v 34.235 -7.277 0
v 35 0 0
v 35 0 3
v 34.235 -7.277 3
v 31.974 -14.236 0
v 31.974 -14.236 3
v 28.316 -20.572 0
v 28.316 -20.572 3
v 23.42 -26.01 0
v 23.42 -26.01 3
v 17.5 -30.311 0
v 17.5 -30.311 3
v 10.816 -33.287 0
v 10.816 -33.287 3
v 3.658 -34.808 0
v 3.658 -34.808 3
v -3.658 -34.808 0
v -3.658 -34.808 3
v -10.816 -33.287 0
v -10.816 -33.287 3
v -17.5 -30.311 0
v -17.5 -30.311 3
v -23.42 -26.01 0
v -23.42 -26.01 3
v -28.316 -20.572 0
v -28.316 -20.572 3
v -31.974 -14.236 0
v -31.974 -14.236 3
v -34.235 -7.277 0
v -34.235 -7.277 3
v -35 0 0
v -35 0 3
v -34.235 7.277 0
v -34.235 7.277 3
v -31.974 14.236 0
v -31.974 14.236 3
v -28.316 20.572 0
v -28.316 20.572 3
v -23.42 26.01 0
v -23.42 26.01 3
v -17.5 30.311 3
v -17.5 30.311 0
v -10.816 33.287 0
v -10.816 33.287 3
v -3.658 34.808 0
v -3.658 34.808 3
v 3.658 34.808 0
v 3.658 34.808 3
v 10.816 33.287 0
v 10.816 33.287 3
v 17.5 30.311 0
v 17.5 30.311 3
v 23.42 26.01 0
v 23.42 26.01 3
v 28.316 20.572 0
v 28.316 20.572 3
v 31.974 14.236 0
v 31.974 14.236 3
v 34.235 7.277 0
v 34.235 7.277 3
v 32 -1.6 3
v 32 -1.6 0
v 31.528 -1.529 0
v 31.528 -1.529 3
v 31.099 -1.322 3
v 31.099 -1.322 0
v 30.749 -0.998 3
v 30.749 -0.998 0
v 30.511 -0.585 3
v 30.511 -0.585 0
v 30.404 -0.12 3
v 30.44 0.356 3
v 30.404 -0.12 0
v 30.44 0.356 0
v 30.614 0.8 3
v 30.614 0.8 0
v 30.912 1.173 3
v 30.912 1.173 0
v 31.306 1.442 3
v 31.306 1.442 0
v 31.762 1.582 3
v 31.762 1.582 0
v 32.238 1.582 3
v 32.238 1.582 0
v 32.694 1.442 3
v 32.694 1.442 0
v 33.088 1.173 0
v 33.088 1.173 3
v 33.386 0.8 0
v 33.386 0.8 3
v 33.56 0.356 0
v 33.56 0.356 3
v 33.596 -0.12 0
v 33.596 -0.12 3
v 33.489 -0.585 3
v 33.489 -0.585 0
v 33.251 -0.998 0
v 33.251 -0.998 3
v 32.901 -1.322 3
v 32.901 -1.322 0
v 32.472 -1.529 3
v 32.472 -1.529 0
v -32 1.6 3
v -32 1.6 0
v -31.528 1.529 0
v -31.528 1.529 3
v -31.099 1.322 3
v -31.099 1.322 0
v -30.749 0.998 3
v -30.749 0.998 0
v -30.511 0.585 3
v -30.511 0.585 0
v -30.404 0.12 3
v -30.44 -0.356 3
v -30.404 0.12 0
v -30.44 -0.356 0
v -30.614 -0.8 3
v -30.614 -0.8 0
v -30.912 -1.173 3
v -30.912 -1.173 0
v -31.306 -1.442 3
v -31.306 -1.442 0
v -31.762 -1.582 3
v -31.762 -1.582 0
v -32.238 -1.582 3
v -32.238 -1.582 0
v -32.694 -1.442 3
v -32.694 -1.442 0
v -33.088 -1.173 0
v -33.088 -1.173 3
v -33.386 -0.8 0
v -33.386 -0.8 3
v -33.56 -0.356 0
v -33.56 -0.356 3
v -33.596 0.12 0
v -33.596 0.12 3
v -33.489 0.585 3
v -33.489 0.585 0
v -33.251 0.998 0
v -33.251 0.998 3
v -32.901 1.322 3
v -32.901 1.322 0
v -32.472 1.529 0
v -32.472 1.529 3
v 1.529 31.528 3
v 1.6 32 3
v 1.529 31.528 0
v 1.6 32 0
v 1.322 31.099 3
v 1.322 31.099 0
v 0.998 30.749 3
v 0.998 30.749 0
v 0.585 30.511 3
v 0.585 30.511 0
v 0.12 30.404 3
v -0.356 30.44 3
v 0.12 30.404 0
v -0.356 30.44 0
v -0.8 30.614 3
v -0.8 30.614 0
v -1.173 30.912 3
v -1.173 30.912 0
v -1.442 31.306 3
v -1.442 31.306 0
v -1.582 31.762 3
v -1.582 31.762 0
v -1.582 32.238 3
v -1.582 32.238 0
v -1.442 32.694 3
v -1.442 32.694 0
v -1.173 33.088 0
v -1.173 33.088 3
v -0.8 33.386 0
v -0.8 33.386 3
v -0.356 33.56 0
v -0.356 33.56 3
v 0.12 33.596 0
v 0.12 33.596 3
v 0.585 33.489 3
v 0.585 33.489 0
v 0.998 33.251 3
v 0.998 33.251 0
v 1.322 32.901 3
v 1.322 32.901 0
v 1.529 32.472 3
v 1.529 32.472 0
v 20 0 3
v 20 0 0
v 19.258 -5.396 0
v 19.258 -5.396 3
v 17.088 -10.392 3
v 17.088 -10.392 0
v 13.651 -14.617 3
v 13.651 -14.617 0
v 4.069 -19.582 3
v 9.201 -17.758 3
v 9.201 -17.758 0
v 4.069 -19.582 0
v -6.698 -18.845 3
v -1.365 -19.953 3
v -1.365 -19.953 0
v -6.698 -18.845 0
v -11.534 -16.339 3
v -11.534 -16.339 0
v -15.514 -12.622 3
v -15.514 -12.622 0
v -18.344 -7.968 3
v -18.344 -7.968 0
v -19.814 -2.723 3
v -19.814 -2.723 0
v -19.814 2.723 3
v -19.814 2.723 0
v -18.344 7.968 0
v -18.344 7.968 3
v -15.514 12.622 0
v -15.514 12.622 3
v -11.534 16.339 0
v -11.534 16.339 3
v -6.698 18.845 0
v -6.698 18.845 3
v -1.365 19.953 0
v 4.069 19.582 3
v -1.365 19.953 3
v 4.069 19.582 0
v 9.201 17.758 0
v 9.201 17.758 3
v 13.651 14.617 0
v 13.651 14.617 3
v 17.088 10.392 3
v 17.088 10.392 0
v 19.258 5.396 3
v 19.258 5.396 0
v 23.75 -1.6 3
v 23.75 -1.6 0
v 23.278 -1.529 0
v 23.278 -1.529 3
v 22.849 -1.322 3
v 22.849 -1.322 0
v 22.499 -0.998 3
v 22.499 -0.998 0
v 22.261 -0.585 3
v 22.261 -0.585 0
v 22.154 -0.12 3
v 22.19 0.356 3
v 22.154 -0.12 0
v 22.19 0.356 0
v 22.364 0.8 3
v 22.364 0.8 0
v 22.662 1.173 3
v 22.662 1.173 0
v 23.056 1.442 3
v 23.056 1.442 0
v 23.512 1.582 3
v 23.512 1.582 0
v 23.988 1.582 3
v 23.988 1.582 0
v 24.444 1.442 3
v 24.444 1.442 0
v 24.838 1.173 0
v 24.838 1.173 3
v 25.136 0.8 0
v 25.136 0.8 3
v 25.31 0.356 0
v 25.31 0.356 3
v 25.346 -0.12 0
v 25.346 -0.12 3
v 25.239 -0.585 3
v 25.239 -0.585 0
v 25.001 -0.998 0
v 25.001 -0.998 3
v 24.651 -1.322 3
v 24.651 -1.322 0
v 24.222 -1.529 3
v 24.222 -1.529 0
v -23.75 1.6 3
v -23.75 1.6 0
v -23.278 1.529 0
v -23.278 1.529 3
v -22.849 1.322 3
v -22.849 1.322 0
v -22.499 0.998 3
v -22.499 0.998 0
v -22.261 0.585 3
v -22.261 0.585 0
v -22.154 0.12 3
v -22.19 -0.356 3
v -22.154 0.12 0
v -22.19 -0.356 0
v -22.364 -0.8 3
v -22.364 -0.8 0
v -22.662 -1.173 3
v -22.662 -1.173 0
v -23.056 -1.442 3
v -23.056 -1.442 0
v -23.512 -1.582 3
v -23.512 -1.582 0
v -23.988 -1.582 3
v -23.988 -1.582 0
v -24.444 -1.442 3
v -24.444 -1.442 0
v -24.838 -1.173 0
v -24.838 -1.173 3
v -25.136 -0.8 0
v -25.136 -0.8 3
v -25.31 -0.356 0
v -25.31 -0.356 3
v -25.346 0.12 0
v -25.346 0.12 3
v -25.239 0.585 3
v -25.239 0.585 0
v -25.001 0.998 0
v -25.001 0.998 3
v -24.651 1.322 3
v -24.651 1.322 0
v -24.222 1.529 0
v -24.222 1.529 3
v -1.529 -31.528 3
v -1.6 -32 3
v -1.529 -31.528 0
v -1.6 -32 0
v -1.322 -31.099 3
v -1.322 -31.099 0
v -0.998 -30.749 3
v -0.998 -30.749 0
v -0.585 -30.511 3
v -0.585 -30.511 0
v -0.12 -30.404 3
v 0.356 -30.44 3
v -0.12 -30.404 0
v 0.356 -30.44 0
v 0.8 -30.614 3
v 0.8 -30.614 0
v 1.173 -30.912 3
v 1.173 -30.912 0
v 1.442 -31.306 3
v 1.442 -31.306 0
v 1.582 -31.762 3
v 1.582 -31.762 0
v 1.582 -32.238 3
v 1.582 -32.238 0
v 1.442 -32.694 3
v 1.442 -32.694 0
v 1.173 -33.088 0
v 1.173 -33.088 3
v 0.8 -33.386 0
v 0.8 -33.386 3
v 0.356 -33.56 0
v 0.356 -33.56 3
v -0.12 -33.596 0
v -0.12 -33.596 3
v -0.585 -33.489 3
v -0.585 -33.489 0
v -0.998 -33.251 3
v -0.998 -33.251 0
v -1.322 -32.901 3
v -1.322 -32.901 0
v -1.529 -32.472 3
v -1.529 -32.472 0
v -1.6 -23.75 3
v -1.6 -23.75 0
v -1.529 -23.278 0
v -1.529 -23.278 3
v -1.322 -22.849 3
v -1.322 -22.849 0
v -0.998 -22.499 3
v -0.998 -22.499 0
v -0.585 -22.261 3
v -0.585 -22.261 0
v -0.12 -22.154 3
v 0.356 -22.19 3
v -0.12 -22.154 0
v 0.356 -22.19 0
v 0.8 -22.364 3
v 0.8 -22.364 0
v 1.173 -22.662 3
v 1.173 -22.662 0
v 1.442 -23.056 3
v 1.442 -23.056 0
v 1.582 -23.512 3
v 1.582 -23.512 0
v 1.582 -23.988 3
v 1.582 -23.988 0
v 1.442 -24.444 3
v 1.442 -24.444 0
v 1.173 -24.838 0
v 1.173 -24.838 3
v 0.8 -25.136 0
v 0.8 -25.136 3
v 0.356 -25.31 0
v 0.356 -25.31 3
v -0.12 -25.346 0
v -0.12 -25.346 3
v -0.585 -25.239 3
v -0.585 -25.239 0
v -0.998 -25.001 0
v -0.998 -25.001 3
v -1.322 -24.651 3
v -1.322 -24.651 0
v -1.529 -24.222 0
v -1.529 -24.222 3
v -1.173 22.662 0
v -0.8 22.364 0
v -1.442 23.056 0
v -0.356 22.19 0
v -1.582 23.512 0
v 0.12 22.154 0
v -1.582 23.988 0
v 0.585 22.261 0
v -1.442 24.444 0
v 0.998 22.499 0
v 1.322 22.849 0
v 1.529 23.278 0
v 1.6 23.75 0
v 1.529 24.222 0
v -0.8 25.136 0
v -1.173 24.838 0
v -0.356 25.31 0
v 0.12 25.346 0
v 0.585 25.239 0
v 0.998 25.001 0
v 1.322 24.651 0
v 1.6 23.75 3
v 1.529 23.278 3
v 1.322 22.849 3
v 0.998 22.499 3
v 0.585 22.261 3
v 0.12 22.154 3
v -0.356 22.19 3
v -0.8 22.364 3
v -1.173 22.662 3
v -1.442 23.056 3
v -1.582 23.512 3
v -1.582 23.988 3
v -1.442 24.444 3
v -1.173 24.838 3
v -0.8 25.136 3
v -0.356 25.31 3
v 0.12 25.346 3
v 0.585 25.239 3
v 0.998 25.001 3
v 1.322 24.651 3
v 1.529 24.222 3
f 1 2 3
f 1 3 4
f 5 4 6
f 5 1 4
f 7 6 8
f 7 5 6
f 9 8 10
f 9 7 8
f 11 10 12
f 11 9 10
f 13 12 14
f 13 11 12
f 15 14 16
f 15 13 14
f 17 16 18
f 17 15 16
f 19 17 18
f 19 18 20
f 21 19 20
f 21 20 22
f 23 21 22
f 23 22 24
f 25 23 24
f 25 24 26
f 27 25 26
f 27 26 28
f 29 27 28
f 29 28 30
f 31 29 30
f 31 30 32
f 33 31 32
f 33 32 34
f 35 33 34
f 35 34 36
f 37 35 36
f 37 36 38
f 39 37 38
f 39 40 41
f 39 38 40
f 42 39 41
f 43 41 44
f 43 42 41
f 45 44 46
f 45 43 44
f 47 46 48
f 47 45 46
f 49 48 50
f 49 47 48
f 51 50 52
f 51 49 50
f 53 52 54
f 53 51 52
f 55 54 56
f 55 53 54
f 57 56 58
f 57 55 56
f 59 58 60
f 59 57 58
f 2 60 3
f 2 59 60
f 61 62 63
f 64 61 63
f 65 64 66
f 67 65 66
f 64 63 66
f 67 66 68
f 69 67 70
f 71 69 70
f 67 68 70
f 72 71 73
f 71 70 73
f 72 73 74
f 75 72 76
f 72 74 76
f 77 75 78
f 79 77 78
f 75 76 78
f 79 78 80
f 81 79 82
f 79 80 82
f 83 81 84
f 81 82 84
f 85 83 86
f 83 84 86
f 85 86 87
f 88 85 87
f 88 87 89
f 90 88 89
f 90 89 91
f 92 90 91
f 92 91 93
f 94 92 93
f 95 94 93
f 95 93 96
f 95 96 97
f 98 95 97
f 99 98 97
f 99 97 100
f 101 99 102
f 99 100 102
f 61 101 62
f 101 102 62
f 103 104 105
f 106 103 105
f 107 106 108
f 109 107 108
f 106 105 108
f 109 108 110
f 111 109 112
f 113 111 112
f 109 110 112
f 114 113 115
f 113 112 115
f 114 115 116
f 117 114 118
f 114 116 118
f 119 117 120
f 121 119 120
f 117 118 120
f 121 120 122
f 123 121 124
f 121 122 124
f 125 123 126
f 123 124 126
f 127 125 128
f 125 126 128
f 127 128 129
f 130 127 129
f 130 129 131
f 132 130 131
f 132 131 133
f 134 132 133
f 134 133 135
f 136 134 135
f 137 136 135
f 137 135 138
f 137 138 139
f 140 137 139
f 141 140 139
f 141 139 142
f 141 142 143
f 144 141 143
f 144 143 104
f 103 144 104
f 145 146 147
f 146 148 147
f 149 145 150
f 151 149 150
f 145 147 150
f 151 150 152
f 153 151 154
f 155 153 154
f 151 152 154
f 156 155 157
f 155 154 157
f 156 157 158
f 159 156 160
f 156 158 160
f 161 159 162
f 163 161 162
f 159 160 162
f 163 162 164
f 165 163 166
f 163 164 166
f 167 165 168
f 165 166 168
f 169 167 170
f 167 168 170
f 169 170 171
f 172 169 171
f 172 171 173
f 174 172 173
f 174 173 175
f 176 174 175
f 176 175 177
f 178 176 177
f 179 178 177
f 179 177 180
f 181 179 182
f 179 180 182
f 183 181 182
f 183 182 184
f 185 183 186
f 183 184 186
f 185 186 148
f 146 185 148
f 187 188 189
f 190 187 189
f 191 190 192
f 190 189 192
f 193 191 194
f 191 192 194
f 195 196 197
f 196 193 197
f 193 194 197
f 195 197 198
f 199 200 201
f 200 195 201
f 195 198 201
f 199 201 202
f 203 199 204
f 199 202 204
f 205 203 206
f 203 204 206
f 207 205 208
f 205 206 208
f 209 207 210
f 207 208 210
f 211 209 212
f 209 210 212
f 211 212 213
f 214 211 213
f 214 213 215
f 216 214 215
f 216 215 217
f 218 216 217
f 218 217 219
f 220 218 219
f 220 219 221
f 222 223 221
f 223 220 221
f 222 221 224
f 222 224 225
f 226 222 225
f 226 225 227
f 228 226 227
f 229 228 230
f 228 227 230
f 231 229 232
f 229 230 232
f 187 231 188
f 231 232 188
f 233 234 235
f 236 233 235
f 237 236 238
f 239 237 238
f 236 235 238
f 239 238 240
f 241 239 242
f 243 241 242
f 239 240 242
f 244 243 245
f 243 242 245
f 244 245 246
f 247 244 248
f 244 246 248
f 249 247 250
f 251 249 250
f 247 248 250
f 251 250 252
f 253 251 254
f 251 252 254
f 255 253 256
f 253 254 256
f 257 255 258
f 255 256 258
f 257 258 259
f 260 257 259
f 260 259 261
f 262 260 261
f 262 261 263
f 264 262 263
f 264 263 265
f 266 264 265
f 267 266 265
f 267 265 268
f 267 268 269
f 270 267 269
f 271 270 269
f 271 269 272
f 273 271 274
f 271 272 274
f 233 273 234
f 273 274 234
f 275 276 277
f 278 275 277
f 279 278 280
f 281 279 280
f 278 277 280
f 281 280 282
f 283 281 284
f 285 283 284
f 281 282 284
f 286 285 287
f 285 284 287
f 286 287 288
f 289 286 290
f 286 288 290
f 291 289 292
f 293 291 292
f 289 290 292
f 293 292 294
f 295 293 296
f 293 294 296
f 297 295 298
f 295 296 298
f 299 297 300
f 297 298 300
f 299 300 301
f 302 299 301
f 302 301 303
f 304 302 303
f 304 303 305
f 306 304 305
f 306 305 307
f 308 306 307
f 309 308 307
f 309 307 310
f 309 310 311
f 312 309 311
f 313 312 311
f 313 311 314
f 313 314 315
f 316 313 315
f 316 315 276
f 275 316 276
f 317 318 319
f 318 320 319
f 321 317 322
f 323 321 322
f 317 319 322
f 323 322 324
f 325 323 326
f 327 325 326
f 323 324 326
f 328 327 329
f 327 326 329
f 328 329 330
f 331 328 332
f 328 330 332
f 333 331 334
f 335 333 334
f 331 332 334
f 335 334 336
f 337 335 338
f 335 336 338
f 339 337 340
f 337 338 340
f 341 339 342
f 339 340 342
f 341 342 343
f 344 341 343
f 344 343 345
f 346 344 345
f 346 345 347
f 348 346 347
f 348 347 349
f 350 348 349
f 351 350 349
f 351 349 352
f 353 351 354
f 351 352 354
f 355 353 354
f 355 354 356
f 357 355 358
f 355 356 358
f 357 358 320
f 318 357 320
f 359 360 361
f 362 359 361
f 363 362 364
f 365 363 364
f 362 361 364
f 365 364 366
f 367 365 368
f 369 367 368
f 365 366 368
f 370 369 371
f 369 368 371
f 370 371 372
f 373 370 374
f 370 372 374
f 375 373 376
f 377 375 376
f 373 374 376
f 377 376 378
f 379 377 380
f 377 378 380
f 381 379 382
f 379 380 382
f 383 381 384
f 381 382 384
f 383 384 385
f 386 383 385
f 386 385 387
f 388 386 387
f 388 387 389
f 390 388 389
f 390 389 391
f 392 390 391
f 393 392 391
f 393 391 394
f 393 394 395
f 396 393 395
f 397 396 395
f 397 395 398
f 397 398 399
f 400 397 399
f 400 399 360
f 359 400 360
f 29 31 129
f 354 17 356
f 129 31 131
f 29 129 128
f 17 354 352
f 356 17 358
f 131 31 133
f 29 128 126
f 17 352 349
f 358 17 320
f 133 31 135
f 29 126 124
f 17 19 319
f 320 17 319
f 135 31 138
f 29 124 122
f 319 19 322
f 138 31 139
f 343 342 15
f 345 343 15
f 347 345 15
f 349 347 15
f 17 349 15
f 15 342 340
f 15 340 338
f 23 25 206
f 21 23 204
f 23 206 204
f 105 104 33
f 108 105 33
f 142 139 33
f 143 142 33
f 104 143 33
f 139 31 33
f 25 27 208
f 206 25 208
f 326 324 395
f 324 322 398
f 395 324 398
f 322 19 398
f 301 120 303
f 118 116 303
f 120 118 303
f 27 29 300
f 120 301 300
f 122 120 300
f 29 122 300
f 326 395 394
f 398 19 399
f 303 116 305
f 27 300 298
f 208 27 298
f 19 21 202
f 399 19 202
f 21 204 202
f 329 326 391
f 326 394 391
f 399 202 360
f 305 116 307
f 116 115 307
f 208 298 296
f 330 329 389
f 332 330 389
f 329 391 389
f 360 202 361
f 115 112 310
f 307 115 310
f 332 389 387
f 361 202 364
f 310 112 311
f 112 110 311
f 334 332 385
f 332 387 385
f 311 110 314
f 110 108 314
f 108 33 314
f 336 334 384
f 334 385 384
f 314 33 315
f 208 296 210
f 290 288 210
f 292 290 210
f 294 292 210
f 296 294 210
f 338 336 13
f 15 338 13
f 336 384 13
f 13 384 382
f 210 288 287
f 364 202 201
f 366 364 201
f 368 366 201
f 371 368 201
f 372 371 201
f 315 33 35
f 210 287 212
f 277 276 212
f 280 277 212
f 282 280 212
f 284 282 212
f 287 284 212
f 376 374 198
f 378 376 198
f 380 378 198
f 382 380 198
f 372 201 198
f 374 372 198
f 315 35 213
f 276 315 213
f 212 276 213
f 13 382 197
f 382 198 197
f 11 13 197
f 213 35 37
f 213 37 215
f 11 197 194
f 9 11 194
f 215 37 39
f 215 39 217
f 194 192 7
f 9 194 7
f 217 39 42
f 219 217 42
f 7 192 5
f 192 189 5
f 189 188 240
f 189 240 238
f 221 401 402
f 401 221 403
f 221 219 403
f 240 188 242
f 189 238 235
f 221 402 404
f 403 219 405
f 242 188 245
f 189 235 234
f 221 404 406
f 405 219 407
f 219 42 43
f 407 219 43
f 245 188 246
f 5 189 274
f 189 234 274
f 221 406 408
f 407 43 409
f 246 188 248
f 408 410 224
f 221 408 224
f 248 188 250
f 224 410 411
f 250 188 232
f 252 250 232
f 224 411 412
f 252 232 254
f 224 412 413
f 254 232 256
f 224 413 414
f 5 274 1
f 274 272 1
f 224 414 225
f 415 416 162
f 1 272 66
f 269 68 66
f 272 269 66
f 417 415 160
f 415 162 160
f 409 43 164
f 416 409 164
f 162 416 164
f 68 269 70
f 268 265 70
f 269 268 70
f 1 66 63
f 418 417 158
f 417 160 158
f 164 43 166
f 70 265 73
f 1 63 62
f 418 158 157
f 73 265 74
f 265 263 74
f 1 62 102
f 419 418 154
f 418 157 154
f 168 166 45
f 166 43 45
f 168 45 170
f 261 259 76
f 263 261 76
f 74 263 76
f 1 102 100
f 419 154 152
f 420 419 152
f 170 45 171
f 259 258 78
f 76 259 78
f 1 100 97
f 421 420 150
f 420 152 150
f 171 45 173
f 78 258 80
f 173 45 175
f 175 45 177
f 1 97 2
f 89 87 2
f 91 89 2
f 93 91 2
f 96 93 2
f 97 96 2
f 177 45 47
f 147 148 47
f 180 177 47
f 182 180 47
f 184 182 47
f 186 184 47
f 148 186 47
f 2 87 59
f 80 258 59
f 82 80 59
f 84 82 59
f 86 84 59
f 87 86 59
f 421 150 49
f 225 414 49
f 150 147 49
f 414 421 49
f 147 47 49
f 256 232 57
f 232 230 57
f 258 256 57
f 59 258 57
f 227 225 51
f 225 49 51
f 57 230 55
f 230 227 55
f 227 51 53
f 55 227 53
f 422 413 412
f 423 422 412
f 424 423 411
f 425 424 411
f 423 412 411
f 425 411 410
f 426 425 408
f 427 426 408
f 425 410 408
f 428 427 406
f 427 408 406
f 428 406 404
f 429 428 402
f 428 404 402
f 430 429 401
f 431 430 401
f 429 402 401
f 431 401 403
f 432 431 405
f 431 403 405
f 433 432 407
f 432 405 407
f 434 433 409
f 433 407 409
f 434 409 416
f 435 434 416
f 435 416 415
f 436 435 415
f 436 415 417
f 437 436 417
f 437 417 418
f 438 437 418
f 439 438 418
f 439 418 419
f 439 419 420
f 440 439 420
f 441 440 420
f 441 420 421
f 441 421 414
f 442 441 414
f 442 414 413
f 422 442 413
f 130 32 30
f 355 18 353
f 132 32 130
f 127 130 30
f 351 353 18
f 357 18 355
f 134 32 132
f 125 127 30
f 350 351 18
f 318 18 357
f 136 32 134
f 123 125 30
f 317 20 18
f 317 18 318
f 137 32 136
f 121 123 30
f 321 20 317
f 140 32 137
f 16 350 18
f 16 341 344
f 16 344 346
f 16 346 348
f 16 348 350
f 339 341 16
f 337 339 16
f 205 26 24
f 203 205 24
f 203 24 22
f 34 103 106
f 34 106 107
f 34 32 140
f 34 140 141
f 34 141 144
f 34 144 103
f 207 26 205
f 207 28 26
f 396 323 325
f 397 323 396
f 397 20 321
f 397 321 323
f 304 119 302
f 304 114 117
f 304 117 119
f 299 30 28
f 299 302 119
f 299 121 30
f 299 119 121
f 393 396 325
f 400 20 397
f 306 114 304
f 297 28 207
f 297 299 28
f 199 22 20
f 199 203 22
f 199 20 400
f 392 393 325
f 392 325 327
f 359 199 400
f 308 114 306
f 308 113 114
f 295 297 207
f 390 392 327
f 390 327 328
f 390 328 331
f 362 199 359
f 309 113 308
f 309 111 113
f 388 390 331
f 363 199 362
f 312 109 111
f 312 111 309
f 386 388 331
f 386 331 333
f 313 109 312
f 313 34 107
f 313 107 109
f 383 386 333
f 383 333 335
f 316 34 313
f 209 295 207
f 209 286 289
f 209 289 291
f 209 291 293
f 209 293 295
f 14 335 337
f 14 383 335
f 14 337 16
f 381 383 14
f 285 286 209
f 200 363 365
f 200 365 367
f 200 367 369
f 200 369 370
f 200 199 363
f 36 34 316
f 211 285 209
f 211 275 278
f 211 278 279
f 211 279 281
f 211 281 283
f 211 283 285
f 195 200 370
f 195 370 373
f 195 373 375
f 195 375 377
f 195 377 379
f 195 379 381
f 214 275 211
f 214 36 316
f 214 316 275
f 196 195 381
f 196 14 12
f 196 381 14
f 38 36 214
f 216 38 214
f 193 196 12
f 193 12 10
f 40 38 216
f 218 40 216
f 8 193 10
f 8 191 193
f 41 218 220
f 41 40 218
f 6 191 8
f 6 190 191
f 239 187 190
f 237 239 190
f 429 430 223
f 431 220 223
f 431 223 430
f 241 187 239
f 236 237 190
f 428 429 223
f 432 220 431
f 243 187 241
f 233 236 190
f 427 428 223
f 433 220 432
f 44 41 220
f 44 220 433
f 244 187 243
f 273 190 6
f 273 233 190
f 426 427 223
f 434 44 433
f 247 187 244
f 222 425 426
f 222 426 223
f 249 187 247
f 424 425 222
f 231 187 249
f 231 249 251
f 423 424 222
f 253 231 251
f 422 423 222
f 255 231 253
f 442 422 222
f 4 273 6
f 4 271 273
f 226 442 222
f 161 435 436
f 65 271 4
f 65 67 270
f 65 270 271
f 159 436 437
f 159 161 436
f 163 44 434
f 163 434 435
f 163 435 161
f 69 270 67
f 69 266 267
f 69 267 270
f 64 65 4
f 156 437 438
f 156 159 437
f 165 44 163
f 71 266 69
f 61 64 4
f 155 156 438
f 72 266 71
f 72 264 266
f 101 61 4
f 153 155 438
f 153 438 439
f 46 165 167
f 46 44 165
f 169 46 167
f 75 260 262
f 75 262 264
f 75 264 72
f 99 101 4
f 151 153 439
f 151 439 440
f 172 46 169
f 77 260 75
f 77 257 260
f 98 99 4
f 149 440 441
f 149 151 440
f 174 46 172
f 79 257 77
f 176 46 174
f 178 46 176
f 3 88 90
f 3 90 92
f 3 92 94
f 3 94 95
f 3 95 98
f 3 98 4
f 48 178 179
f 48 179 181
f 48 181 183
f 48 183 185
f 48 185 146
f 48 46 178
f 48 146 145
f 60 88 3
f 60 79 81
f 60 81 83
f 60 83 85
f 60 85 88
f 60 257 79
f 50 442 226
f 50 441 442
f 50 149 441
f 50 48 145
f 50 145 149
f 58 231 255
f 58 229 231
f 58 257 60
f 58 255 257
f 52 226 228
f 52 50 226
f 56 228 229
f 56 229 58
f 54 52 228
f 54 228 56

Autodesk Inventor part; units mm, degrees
ref_plane "YZ Plane" through (0, 0, 0) normal (1, 0, 0) x (0, 1, 0)
ref_plane "XZ Plane" through (0, 0, 0) normal (0, 1, 0) x (-1, 0, 0)
ref_plane "XY Plane" through (0, 0, 0) normal (0, 0, 1) x (1, 0, 0)
sketch "Sketch1" plane through (0, 0, 0) normal (0, 0, 1) x (1, 0, 0)
  circle A0 centre (0, 0) radius 20
  circle A1 centre (0, 0) radius 35
  dimension "d0" = 70
  dimension "d1" = 40
extrude "Extrusion1" add sketch "Sketch1" along normal blind 3
sketch "Sketch2" plane through (0, 0, 3) normal (0, 0, 1) x (1, 0, 0)
  circle A0 centre (0, 0) radius 23.75 construction
  circle A1 centre (0, 0) radius 32 construction
  point P0 (23.75, 0)
  point P1 (32, 0)
  dimension "d4" = 64
  dimension "d5" = 47.5
hole "Hole1" at (23.75, 0, 3) at (32, 0, 3) direction (0, 0, -1) diameter 3.2 end through all
pattern_circular "Circular Pattern1" count 4 over 360 about axis through (0, 0, 0) along (0, 0, 1) of "Hole1"
properties part number "plasma_chamber_holder" material "Copper"
